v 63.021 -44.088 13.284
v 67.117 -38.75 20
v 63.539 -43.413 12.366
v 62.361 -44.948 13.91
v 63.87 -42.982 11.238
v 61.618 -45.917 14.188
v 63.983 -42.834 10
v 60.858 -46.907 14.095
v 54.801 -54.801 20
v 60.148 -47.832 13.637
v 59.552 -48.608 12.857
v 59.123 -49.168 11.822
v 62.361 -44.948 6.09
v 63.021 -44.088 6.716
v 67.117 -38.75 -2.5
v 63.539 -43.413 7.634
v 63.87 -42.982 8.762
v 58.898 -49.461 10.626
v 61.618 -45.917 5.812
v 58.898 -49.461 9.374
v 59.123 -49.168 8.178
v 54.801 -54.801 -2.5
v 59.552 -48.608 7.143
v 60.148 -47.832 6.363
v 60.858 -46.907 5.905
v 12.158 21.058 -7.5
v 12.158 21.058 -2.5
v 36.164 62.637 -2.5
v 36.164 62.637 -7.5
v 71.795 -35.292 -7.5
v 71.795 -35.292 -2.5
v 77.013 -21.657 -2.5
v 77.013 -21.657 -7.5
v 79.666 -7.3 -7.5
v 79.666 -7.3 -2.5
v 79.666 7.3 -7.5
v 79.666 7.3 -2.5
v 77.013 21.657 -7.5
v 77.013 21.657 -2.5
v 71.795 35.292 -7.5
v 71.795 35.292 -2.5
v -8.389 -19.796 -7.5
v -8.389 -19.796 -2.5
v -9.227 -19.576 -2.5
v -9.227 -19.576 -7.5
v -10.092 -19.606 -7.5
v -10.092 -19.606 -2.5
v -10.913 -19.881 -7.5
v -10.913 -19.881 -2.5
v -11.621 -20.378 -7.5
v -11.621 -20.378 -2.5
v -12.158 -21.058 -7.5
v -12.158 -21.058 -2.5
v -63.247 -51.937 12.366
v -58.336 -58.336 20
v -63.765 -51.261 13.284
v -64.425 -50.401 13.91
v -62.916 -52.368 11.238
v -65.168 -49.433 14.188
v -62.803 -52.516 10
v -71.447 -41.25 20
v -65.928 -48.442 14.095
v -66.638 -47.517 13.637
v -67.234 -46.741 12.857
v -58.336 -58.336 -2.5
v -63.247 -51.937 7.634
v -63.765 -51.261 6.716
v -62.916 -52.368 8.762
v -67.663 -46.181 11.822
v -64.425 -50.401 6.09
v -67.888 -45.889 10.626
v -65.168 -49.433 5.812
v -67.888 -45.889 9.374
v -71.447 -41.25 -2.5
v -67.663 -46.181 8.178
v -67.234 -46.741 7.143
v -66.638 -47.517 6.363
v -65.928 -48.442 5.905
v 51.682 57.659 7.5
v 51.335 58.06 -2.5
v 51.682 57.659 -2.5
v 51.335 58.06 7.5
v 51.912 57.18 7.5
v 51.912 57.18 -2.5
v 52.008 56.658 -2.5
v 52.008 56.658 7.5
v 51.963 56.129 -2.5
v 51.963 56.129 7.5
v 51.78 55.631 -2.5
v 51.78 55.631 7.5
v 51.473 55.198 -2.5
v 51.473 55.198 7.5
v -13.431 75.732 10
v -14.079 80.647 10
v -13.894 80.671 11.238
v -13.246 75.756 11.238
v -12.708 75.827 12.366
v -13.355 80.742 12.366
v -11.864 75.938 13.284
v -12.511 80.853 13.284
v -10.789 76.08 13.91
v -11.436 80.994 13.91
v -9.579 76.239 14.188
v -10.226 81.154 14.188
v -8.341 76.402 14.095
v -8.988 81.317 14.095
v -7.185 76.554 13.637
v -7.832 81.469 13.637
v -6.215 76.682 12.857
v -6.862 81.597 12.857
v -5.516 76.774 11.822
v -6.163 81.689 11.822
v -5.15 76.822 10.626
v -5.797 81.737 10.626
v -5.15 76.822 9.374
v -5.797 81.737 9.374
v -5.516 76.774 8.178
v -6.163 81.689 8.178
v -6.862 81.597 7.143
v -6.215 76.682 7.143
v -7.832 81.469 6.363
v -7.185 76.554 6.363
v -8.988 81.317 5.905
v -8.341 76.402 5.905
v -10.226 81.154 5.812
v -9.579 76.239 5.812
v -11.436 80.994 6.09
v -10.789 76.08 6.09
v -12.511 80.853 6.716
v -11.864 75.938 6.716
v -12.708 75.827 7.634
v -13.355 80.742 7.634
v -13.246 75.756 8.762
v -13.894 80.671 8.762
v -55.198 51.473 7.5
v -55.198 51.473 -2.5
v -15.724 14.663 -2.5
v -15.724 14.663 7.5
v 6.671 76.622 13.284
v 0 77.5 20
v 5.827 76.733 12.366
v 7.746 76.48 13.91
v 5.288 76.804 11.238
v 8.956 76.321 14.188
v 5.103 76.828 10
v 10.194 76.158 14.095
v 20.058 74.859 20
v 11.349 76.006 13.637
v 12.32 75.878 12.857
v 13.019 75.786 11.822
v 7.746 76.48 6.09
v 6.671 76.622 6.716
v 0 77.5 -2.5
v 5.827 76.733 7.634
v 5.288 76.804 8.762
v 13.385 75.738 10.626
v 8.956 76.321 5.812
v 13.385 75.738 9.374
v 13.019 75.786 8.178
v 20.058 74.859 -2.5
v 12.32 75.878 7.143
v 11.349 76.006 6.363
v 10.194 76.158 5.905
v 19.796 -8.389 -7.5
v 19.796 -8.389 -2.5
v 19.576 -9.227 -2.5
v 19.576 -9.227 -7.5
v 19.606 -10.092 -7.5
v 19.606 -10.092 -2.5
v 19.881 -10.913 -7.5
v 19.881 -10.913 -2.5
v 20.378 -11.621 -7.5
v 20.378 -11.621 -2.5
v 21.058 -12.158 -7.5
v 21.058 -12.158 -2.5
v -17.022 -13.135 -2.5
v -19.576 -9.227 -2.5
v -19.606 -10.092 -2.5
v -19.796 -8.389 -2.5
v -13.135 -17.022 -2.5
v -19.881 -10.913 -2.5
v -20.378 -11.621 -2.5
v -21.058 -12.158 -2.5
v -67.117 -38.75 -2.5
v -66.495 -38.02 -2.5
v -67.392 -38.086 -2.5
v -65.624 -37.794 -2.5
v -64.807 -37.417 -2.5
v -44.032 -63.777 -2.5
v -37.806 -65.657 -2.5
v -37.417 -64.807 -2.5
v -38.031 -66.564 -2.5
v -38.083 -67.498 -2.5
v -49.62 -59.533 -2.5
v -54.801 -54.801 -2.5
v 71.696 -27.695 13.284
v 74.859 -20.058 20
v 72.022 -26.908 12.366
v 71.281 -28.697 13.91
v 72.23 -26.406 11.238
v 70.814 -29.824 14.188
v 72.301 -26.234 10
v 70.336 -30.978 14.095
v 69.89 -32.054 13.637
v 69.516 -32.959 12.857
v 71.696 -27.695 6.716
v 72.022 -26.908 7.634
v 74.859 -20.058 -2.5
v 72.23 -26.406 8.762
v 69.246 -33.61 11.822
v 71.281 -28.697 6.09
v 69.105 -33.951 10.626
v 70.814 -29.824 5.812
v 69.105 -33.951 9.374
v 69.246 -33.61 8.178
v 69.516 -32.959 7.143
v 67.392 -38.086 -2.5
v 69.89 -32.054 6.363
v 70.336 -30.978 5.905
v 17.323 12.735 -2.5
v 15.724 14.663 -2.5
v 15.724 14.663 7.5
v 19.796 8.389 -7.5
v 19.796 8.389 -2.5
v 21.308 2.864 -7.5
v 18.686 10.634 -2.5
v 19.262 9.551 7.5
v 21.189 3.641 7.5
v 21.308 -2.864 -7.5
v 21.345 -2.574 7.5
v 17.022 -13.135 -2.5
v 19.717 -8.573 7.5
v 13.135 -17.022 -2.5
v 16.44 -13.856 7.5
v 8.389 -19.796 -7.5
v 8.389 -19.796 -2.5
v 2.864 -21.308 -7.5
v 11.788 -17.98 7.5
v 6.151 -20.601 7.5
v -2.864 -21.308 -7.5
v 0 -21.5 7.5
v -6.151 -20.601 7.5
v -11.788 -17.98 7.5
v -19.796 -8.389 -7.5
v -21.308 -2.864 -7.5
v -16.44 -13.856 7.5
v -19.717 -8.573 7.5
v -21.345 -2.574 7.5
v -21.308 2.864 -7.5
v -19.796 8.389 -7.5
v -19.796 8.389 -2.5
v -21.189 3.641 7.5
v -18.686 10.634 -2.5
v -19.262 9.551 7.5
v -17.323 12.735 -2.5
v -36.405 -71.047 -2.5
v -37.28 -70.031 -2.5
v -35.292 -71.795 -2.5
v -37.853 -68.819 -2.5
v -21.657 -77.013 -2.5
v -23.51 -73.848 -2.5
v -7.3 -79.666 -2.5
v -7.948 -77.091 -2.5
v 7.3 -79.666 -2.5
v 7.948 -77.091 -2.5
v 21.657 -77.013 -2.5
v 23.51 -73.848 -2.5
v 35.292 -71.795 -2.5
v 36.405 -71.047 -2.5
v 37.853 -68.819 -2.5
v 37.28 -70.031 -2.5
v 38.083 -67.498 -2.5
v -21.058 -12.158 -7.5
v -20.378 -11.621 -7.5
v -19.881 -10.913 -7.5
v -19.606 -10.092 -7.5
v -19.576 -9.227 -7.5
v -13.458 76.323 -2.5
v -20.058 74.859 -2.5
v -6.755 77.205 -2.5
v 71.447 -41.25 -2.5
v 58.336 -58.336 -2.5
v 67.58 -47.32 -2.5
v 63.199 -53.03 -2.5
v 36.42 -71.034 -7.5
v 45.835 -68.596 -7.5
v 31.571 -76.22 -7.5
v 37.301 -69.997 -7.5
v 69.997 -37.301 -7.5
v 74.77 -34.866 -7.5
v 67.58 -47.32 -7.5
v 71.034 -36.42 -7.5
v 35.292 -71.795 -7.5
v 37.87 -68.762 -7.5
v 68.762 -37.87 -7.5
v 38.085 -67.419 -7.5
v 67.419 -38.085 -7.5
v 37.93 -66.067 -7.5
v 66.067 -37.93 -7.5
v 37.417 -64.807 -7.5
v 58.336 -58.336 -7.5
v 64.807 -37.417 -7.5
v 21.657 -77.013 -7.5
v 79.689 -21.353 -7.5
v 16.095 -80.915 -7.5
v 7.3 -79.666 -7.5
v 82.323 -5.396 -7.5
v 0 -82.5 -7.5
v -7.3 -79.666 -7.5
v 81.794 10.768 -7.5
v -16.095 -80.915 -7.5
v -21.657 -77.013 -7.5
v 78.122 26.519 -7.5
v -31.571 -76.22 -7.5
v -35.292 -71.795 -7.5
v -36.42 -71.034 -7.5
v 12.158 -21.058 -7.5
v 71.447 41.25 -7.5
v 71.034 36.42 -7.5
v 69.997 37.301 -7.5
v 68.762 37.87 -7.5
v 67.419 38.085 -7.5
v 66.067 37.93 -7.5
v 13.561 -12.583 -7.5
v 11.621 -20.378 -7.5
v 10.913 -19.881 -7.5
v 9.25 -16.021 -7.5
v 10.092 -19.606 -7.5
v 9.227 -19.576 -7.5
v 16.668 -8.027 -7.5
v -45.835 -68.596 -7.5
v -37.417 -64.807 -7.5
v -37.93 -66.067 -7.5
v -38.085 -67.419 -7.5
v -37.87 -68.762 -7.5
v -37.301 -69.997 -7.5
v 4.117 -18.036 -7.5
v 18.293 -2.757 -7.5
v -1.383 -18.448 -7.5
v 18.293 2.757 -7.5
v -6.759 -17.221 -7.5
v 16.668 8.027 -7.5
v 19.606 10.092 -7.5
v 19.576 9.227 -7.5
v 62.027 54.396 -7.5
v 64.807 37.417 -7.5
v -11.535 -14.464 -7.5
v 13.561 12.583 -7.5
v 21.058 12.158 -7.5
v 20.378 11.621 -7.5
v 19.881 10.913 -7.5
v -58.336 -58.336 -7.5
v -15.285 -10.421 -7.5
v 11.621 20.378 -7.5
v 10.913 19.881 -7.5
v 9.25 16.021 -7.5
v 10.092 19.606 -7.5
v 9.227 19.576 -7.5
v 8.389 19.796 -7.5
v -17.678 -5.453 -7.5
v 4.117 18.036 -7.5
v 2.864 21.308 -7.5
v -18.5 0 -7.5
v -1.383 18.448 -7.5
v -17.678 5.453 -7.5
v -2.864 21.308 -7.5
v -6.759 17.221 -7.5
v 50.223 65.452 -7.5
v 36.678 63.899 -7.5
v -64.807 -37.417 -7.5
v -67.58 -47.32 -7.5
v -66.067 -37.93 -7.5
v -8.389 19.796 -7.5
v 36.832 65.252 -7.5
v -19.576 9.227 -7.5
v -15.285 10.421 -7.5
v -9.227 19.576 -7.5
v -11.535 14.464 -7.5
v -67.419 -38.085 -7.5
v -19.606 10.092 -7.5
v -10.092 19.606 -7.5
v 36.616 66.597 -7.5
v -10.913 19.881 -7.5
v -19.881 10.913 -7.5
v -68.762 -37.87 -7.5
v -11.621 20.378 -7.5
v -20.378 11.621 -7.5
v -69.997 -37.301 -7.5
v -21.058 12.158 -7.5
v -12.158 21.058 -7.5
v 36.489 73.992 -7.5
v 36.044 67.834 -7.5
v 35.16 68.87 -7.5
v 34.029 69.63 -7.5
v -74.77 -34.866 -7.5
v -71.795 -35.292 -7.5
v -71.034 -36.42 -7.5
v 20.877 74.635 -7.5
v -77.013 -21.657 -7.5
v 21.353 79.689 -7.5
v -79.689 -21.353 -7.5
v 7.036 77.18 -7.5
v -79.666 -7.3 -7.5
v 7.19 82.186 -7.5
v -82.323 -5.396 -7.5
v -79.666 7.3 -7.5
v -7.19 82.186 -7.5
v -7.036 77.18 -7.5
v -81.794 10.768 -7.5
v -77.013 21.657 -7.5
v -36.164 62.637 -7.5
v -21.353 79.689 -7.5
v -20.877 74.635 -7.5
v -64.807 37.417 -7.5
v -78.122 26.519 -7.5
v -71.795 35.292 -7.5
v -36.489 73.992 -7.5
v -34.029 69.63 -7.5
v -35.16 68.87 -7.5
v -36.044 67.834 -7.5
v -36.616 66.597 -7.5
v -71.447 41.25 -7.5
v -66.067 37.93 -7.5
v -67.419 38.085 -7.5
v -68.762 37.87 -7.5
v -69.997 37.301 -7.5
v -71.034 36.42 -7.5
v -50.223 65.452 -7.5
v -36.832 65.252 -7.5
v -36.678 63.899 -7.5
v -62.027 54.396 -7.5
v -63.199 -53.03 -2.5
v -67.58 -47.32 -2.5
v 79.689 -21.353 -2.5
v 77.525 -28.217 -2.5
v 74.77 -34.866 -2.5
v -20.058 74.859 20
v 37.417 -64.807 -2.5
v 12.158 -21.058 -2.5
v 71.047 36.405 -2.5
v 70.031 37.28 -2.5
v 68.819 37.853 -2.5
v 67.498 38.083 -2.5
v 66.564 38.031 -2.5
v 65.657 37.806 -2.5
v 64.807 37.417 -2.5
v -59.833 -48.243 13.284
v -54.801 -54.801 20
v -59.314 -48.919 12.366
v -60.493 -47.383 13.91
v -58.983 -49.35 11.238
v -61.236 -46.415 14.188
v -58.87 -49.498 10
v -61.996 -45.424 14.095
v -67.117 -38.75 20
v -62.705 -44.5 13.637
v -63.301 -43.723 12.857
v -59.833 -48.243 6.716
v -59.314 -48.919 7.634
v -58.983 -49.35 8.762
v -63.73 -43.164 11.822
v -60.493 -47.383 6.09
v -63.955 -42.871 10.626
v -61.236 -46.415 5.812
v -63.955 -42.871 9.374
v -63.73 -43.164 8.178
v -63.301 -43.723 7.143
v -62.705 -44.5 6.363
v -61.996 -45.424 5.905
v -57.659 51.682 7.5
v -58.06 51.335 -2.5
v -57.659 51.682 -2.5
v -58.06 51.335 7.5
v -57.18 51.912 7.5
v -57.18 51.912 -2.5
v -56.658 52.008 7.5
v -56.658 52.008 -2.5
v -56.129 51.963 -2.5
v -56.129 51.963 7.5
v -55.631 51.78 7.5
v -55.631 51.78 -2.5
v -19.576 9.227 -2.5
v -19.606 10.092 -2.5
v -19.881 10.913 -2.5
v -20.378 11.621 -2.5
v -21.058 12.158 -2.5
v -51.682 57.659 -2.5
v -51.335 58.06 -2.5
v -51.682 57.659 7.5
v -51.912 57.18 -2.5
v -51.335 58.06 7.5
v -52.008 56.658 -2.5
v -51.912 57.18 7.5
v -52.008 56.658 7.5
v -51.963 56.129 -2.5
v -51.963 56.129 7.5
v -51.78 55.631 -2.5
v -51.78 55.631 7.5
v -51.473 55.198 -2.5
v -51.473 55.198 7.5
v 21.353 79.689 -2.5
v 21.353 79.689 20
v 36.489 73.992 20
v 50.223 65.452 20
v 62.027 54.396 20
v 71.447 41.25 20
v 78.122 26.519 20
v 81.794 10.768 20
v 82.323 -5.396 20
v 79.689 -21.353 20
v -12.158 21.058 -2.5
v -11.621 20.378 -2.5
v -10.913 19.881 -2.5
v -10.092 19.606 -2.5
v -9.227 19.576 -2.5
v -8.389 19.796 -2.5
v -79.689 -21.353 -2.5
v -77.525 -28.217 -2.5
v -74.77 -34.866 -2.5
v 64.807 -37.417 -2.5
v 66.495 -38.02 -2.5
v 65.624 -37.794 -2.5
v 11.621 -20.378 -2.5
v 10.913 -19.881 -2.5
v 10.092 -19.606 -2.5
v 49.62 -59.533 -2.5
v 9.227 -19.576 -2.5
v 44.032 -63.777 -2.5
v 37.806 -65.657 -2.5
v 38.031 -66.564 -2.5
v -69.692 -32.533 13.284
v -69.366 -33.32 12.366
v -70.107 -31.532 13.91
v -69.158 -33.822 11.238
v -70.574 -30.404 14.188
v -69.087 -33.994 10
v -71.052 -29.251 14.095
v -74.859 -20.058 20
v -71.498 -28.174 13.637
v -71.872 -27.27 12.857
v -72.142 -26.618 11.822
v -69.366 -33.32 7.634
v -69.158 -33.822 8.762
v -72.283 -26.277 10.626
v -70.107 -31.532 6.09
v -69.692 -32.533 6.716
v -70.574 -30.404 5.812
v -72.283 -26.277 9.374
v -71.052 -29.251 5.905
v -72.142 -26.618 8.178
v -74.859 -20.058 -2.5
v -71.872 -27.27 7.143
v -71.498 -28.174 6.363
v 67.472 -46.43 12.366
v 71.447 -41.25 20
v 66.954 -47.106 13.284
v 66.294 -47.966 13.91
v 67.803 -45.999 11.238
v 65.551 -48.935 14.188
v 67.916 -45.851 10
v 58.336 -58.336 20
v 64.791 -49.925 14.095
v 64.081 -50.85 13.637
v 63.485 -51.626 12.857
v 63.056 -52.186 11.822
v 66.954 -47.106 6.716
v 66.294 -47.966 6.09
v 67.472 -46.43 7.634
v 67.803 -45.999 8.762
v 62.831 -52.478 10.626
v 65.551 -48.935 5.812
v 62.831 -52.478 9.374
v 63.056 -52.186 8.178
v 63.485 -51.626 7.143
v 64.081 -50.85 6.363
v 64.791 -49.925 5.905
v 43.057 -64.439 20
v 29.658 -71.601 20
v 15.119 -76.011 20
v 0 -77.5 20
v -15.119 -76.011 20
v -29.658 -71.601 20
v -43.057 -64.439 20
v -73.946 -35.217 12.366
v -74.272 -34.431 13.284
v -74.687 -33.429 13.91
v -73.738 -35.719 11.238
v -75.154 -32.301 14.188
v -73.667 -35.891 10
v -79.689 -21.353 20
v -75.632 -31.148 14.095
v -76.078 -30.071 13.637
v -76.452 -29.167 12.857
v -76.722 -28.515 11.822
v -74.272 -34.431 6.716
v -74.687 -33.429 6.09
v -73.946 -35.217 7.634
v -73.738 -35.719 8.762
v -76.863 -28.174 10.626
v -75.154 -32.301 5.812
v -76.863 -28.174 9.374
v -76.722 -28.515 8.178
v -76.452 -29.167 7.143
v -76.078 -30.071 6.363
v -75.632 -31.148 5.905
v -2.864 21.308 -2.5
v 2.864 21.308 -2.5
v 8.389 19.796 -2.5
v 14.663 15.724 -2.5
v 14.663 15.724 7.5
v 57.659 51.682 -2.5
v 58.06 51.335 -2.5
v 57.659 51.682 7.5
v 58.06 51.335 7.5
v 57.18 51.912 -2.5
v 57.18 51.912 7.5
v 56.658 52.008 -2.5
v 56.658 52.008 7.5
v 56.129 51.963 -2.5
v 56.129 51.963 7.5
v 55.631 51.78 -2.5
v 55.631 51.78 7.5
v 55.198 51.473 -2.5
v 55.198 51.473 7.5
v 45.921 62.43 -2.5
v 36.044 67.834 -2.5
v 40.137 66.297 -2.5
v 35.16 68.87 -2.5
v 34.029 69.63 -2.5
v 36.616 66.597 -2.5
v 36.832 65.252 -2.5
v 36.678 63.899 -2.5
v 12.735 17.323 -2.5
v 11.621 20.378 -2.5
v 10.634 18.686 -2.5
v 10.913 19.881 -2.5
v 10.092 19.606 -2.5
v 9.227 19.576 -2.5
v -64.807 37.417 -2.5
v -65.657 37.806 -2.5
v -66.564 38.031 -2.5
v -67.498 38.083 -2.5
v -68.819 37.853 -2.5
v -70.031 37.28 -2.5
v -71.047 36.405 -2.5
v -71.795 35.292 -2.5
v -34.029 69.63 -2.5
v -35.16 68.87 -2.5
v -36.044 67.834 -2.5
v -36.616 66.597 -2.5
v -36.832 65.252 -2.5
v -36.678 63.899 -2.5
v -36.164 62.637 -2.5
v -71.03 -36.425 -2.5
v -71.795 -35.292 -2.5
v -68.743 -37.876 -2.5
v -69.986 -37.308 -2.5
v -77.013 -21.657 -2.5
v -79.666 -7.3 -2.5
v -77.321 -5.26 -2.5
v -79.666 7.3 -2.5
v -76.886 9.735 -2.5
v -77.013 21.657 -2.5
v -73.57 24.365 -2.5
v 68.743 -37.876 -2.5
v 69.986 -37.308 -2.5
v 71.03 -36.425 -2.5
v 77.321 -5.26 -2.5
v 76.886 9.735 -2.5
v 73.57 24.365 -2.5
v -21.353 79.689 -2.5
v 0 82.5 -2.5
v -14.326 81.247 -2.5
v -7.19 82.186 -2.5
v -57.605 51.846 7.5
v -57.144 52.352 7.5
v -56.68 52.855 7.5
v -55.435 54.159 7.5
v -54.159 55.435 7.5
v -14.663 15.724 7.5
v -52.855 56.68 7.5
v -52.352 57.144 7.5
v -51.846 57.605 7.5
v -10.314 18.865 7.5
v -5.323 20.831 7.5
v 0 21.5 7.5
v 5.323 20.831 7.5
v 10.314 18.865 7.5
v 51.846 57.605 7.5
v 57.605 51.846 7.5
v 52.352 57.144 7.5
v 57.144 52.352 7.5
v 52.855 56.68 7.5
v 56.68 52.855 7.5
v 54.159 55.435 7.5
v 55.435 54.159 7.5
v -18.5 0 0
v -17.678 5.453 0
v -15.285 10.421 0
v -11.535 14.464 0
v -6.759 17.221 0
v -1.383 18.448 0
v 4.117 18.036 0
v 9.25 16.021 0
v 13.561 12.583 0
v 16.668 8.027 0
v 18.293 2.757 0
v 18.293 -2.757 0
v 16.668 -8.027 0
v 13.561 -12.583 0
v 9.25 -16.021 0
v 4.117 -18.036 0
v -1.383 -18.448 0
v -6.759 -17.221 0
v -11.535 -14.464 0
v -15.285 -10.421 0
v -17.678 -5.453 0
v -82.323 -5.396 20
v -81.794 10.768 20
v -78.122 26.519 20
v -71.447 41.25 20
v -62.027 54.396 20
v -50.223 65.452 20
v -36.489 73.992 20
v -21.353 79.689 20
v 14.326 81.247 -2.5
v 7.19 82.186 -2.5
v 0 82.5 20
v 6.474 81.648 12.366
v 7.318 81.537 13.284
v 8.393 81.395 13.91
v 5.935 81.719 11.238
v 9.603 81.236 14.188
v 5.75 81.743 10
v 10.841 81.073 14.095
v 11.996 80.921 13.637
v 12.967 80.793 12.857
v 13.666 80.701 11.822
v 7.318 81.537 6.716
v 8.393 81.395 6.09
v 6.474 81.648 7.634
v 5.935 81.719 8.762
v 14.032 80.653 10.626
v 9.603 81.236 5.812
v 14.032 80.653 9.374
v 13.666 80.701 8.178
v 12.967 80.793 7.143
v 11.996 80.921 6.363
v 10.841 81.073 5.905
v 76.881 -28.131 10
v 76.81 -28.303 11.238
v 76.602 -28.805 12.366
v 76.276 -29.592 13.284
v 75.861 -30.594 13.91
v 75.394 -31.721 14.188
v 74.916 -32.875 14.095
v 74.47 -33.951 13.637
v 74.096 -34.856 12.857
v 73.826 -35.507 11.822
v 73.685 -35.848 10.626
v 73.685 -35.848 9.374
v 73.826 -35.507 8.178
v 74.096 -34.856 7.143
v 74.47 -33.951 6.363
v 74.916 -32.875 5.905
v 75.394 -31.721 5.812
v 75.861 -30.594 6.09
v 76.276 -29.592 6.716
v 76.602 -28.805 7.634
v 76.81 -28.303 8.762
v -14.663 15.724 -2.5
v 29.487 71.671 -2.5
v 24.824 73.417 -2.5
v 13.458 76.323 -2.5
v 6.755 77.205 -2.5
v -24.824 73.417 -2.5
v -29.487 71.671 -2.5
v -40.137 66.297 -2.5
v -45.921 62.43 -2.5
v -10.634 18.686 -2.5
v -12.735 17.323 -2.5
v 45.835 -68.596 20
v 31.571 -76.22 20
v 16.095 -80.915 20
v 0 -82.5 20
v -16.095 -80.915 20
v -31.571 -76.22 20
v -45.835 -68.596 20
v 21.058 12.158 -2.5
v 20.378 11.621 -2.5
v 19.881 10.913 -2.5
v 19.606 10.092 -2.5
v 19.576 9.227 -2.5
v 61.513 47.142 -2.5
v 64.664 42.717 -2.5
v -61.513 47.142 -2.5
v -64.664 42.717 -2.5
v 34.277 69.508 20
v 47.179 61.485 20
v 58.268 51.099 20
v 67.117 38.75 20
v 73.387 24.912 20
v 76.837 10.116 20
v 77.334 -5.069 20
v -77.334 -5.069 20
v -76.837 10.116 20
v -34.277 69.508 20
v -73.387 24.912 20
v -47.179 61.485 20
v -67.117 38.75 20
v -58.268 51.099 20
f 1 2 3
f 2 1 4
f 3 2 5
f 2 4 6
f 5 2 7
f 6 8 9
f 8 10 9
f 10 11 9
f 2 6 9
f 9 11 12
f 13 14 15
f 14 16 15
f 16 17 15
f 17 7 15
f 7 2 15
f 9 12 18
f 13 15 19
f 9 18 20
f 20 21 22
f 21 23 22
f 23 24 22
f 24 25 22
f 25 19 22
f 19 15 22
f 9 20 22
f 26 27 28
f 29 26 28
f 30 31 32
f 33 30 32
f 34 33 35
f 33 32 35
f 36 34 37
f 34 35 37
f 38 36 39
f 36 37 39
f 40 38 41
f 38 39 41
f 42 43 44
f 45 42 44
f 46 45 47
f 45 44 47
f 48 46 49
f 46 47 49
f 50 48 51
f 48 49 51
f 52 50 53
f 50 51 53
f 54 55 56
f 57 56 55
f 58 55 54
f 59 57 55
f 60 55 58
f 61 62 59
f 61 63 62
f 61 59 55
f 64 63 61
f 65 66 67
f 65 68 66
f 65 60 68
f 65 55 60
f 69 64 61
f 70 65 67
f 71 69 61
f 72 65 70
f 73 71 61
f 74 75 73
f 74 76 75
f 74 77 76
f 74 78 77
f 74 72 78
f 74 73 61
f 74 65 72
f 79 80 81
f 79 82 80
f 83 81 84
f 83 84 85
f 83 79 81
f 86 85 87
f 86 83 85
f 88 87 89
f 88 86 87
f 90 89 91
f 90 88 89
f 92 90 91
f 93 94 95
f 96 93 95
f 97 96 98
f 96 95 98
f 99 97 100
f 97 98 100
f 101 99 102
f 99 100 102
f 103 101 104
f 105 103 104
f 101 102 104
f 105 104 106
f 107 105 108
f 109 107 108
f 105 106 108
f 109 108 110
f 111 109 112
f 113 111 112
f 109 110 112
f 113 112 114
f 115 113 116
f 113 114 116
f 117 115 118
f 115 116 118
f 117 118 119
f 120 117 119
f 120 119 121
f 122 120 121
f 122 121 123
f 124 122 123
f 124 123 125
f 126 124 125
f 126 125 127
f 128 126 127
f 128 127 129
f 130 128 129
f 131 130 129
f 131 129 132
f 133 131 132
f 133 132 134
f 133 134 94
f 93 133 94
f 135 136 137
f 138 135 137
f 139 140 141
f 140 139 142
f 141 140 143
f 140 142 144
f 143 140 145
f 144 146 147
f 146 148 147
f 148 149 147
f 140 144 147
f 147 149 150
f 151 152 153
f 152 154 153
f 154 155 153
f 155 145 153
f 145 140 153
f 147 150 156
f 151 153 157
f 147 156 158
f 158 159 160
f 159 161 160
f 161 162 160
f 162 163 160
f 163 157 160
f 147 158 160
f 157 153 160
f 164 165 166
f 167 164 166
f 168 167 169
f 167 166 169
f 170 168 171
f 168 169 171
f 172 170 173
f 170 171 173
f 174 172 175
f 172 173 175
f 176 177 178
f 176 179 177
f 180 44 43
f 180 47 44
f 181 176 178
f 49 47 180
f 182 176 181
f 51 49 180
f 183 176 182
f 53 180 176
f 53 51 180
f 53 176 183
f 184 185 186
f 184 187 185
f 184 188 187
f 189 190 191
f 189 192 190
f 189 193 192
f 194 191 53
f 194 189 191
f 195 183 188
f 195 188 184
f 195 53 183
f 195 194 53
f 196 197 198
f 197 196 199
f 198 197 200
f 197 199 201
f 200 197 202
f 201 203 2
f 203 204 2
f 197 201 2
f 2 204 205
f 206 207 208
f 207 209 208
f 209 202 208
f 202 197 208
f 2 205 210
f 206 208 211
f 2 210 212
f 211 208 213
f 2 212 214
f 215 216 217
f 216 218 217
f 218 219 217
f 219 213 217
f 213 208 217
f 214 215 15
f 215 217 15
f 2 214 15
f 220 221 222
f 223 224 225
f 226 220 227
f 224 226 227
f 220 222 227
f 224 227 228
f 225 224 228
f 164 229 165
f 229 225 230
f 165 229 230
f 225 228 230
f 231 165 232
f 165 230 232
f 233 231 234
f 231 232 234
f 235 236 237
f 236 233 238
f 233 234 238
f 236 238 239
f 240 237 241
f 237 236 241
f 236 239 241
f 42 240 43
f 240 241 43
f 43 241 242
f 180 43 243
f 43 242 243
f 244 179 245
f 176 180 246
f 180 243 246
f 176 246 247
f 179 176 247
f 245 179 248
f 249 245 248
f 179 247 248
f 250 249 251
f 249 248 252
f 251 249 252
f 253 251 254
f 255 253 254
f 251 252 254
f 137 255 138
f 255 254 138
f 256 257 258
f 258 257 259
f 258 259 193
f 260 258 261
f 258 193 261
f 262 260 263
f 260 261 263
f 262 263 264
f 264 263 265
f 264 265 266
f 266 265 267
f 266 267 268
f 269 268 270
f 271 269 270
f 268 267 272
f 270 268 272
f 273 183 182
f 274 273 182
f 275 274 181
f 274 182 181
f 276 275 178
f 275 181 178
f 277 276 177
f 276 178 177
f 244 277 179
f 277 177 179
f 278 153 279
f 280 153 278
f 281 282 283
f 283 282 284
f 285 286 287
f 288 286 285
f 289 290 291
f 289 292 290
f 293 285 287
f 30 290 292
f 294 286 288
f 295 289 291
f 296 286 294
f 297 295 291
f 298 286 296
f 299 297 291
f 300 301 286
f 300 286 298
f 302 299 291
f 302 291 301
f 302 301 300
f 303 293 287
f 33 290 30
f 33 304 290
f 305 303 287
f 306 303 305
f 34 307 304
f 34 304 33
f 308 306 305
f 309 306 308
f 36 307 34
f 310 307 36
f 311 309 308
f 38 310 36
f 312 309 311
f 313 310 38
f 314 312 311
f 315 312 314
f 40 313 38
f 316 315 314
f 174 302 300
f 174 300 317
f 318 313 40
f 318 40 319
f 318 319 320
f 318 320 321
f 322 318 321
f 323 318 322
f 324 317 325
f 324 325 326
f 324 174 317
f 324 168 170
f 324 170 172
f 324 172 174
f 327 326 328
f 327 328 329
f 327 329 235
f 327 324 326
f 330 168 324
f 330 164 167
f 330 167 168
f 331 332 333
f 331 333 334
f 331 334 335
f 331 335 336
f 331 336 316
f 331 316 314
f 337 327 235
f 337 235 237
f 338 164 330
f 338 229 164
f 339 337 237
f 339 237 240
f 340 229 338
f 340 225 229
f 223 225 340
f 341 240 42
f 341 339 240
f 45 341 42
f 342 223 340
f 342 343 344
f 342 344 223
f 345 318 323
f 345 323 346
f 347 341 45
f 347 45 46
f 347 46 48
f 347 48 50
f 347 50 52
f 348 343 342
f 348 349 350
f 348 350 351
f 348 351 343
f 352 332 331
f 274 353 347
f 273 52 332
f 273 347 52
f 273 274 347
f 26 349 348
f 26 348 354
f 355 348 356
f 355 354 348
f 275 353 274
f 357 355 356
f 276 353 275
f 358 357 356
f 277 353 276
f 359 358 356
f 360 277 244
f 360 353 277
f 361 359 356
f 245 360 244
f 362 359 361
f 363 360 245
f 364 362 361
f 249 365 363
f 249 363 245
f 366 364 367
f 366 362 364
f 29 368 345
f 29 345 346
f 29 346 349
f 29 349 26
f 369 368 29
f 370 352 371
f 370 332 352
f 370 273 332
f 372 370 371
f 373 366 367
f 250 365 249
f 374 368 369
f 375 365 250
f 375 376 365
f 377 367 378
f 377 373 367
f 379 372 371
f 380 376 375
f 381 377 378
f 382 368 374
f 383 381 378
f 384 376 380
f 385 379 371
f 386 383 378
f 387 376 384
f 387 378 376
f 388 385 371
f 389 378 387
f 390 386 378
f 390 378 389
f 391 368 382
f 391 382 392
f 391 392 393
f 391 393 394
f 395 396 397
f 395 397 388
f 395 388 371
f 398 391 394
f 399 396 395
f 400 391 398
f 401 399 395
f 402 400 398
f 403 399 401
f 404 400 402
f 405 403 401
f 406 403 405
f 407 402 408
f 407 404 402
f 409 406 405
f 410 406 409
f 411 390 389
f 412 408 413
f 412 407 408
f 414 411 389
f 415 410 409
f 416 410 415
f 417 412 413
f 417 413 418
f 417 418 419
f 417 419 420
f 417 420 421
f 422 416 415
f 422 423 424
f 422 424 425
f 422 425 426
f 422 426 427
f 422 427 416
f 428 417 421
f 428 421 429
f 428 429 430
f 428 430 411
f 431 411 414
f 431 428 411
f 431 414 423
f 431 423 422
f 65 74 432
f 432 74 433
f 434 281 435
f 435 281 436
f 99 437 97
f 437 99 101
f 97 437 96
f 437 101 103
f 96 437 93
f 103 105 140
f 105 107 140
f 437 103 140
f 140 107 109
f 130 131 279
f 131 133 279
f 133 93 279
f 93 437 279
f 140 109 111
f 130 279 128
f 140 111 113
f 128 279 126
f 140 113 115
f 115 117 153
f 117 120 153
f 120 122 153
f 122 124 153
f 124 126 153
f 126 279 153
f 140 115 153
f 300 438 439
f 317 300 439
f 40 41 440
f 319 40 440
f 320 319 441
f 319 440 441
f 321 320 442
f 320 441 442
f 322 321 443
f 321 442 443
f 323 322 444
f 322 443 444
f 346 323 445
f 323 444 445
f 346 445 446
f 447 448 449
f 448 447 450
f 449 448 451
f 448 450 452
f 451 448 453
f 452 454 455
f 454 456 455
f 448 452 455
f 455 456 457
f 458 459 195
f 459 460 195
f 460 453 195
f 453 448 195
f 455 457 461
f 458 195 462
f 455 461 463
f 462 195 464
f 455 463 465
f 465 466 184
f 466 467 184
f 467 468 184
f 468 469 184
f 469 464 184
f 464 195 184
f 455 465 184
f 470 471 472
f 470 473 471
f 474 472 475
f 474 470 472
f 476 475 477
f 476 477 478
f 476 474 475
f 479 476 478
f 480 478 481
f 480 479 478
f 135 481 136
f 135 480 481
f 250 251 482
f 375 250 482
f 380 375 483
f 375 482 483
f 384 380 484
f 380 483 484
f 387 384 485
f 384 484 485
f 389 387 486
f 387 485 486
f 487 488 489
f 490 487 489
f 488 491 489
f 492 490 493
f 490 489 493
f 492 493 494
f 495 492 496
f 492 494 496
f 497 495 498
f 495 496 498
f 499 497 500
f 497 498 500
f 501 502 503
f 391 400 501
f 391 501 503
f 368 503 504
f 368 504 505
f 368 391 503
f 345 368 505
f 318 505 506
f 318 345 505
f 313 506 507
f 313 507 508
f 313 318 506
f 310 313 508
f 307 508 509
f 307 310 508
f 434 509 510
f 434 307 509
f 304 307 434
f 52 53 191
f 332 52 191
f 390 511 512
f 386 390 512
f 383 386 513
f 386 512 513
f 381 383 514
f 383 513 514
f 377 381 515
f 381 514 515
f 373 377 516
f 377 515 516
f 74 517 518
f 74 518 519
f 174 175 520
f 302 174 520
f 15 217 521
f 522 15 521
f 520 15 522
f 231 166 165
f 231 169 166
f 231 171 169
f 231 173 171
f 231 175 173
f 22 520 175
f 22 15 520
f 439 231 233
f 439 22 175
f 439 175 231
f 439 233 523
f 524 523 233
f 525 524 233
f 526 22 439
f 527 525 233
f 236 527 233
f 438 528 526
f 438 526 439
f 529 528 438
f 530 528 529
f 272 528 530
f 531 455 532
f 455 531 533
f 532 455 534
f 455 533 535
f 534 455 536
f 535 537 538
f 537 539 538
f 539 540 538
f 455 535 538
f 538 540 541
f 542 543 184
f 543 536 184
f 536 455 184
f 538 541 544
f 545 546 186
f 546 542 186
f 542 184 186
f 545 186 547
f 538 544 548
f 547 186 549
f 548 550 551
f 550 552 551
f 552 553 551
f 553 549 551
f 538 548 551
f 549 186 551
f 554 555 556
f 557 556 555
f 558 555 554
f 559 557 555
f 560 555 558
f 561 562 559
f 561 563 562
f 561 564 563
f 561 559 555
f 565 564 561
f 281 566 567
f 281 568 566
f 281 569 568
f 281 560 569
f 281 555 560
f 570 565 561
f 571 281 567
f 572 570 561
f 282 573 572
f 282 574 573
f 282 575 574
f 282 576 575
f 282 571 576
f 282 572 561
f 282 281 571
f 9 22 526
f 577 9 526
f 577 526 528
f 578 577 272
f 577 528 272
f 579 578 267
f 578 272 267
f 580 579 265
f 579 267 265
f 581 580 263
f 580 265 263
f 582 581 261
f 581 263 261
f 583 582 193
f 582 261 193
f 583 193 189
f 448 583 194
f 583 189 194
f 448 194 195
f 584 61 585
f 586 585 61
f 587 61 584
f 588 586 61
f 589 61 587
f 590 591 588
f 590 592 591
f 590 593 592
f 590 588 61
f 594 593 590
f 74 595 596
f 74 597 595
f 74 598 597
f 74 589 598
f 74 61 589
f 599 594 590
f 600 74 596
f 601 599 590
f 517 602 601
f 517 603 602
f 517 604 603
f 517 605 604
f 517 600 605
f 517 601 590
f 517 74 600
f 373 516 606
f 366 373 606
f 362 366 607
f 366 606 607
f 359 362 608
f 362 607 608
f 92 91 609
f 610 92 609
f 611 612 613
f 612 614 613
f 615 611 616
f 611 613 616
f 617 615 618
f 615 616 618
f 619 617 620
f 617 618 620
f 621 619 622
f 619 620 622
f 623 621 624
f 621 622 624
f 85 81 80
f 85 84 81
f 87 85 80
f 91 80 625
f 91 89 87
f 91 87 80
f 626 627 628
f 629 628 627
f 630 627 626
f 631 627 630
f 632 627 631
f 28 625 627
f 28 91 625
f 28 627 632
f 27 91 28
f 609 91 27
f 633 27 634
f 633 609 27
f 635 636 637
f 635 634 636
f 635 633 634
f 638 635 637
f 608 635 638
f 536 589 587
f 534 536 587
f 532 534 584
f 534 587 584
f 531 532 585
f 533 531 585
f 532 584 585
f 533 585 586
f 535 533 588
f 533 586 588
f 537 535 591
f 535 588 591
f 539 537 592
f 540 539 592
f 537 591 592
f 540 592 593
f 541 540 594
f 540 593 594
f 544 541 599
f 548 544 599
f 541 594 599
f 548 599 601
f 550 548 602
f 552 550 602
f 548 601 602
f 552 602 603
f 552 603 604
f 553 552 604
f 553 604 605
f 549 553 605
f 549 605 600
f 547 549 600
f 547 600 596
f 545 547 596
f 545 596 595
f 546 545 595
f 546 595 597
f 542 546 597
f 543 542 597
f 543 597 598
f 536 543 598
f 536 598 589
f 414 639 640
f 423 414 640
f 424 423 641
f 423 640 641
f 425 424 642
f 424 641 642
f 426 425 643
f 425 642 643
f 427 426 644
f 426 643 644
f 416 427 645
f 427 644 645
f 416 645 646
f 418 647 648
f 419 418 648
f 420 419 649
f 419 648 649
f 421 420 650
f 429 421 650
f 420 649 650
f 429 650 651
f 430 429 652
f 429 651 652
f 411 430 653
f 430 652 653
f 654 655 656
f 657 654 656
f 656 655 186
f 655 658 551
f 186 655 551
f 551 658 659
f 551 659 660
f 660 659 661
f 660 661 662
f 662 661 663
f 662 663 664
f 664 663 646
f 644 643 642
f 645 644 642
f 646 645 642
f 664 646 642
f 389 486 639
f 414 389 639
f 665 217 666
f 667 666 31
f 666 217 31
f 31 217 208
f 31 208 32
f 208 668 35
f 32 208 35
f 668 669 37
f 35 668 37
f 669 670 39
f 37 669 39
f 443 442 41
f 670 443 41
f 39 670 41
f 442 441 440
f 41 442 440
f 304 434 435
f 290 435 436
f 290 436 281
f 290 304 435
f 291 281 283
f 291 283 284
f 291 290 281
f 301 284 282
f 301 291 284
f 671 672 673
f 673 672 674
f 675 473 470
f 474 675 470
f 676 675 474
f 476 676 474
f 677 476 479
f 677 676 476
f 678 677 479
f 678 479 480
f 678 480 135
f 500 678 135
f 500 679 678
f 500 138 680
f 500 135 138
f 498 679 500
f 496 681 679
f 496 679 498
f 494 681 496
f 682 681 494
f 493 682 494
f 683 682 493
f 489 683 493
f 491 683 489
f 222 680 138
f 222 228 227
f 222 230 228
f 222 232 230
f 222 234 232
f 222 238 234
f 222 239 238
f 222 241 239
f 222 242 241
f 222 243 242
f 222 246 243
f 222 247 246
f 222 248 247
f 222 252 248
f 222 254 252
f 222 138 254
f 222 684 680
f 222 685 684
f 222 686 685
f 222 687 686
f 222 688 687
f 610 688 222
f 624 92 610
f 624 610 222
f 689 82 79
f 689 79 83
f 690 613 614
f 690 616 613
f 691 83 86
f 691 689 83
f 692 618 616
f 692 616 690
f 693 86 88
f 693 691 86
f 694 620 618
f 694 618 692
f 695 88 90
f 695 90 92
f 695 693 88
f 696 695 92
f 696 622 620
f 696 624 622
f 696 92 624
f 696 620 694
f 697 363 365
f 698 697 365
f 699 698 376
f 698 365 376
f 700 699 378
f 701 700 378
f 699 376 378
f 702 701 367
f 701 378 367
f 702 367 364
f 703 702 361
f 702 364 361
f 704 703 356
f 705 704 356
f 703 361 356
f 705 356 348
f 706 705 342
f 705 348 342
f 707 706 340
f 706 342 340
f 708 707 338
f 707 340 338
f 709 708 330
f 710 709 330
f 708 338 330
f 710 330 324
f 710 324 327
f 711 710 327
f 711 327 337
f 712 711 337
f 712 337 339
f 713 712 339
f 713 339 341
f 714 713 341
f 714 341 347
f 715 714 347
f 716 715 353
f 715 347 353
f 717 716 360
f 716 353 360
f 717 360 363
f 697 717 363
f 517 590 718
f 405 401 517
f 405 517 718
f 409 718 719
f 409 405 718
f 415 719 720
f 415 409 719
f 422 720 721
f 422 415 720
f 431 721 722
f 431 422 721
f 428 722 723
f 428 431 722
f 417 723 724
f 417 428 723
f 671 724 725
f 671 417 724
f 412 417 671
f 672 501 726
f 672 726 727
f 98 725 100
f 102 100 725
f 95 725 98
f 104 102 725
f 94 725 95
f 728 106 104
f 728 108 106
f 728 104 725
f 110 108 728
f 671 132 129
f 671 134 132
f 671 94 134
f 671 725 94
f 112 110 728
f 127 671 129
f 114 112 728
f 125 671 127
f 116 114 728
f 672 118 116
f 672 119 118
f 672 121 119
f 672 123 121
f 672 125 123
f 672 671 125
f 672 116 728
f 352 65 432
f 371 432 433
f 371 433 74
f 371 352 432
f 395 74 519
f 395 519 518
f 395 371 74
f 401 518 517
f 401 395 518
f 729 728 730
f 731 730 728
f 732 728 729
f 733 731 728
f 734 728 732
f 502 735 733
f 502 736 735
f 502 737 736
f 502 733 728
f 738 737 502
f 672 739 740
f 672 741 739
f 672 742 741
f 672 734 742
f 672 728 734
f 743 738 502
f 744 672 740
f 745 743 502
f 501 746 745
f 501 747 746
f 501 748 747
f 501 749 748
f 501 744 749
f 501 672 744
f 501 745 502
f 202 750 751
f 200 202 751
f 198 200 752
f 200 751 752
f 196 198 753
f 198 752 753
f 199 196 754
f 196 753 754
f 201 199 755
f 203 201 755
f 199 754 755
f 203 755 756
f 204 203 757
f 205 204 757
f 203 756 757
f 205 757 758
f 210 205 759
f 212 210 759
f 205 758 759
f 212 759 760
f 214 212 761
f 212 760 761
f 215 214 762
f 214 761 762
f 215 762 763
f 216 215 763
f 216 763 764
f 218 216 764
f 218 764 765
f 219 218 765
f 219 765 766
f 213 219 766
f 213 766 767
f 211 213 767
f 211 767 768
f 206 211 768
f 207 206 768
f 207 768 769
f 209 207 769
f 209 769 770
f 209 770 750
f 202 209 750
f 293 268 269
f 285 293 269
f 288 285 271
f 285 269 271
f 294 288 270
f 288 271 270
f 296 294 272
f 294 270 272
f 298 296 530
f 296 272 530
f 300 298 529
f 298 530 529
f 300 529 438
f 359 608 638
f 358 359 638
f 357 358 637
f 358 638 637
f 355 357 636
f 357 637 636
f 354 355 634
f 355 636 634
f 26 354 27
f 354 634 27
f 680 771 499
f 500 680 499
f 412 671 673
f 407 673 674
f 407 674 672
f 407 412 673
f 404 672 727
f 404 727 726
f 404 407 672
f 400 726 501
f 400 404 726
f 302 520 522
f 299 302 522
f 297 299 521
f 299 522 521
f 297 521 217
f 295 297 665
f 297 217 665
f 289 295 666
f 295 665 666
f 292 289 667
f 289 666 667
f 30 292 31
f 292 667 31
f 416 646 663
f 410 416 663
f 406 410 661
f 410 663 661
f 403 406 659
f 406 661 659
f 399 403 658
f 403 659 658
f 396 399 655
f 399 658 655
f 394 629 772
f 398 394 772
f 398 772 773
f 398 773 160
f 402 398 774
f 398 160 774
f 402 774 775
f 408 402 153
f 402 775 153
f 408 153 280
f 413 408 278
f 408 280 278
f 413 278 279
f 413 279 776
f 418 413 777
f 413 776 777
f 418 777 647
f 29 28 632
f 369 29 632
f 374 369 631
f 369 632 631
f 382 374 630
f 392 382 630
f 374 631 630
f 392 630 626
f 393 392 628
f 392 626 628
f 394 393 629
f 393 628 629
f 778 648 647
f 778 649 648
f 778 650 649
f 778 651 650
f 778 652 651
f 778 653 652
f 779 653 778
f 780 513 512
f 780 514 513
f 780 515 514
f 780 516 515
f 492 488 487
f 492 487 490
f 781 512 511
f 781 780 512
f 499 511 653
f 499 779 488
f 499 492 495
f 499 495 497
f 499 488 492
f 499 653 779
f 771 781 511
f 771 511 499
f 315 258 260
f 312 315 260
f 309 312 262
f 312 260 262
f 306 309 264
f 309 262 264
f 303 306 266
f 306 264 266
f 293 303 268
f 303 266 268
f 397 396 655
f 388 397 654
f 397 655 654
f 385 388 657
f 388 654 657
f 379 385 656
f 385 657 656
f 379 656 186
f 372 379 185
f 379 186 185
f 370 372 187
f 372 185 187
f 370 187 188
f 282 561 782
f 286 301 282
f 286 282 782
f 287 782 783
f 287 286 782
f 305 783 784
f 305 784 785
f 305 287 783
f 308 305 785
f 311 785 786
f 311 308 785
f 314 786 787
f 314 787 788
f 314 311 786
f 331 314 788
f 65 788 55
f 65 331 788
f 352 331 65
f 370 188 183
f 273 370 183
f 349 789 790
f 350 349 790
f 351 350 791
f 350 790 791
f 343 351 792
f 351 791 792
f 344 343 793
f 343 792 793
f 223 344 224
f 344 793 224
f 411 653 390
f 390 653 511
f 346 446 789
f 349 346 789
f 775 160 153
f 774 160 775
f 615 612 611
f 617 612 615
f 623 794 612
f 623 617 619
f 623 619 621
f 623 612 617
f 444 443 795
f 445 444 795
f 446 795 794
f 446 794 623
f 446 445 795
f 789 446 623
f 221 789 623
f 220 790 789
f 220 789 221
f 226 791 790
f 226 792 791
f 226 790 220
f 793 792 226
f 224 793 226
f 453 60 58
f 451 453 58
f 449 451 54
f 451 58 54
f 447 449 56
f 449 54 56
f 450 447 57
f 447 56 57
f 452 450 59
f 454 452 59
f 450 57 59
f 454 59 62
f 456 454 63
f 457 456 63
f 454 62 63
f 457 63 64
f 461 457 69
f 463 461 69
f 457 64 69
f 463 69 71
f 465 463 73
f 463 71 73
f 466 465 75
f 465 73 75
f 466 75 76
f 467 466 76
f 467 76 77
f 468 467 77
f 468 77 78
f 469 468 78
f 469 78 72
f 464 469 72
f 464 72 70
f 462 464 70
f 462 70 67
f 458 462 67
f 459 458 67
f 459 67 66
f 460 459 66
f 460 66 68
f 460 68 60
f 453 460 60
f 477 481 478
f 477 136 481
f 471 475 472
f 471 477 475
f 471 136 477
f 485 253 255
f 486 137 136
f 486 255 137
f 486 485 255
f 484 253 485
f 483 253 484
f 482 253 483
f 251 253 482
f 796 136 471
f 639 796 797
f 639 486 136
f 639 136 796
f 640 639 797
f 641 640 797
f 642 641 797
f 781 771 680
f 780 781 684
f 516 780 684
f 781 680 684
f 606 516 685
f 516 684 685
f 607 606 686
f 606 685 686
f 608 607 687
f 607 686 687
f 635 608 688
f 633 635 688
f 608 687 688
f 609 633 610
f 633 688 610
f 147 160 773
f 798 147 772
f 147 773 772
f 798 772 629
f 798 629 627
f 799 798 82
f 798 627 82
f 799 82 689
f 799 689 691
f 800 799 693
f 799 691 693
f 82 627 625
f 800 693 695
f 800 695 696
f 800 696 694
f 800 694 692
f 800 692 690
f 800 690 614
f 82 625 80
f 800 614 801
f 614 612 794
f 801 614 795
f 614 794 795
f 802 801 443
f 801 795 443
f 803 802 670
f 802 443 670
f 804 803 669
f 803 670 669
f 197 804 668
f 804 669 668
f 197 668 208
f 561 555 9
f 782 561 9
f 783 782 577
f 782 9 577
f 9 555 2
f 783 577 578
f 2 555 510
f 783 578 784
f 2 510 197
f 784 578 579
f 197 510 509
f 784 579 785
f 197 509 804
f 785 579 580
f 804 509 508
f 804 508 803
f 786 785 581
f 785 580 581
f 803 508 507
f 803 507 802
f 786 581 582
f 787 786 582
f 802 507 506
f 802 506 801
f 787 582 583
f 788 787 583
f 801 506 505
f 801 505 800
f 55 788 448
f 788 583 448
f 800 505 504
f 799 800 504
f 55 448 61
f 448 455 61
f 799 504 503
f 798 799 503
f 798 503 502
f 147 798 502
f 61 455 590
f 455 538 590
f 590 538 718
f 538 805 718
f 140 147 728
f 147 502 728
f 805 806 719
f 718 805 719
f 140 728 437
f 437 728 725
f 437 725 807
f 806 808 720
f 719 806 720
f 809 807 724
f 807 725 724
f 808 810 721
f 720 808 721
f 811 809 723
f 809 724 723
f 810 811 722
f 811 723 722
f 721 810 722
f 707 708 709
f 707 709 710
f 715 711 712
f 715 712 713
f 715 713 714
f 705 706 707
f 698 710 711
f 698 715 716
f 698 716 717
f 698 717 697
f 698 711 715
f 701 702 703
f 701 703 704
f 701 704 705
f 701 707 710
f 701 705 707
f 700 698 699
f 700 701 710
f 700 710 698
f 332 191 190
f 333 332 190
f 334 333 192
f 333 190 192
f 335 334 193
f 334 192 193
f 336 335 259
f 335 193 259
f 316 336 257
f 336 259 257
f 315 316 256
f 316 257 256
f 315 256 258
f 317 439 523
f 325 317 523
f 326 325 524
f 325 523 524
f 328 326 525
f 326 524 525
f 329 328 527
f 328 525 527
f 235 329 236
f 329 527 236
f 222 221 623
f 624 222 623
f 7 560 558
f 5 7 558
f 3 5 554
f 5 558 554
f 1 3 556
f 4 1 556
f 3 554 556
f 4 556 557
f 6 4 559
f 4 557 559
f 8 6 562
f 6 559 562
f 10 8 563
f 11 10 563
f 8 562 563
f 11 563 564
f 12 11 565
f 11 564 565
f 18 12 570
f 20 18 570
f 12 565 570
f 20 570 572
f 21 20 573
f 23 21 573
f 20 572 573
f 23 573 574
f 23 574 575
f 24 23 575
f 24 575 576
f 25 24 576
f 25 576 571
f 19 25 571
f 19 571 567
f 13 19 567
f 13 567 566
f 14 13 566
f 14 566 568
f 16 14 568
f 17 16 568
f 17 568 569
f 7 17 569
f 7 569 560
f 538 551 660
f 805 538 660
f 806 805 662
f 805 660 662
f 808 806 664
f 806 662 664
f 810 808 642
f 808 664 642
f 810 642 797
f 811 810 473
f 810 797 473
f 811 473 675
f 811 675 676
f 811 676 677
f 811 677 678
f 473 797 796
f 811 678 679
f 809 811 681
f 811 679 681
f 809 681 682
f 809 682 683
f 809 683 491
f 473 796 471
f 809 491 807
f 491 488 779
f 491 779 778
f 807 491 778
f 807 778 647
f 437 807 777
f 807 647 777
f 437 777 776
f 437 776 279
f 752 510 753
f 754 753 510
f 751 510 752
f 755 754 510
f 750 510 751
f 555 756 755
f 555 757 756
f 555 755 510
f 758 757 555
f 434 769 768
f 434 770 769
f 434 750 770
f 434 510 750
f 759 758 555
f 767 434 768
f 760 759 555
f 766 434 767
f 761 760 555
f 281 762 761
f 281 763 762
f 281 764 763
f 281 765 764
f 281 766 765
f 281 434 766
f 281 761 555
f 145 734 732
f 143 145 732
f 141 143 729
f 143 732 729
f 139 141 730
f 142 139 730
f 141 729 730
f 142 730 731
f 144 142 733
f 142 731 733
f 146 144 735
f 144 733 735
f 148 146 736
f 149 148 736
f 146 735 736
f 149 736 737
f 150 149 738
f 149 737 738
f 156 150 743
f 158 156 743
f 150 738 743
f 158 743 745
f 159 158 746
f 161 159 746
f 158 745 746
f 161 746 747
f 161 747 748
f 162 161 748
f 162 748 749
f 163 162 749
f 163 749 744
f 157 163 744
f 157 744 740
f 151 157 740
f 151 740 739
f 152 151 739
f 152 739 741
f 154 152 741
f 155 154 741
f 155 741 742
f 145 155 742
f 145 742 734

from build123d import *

# Parameters (mm, degrees)
EXTRUDE_1_DEPTH                  = 20
EXTRUDE_1_DEPTH_BACK             = 7.5
EXTRUDE_3_DEPTH                  = 7.5
EXTRUDE_3_DEPTH_BACK             = 7.5
SKETCH_3_R                       = 21.5
SKETCH_4_R                       = 18.5
CUT_EXTRUDE_1_DEPTH              = 7.5
SKETCH_12_W                      = 5
SKETCH_12_H                      = 61
CUT_EXTRUDE_6_DEPTH              = 119.822346383
REVOLVE_START                    = -2.5
REVOLVE_3_DEPTH                  = 10
FILLET_1_R                       = 2
PATTERN_CIRCULAR_1_COUNT         = 2
PATTERN_CIRCULAR_1_ANGLE         = 90
FILLET_1_OF_PATTERN_CIRCULAR_1_R = 2
CUT_EXTRUDE_7_REACH              = 191.328
SKETCH_15_R                      = 4.2
CUT_EXTRUDE_8_REACH              = 191.328
SKETCH_16_R                      = 4.2
PATTERN_CIRCULAR_2_COUNT         = 3


# Read off the part's stored shape, not the designer's step: 旋转3
with BuildPart() as part:
    # 草图1 → 凸台-拉伸1 (new, two sides: drawn at the far end of the back side and taken through both)
    with BuildSketch(Plane.XY.offset(-EXTRUDE_1_DEPTH_BACK)):
        with BuildLine():
            Line((0, 82.5), (21.352571221, 79.688880669))
            ThreePointArc((21.352571221, 79.688880669), (71.447095812, 41.25), (79.688880669, -21.352571221))
            Line((79.688880669, -21.352571221), (71.447095812, -41.25))
            Line((71.447095812, -41.25), (58.336309448, -58.336309448))
            ThreePointArc((58.336309448, -58.336309448), (0, -82.5), (-58.336309448, -58.336309448))
            Line((-58.336309448, -58.336309448), (-71.447095812, -41.25))
            Line((-71.447095812, -41.25), (-79.688880669, -21.352571221))
            ThreePointArc((-79.688880669, -21.352571221), (-71.447095812, 41.25), (-21.352571221, 79.688880669))
            Line((-21.352571221, 79.688880669), (0, 82.5))
        make_face()
        with BuildLine():
            Line((0, 77.5), (20.058475995, 74.859251537))
            ThreePointArc((20.058475995, 74.859251537), (67.116968793, 38.75), (74.859251537, -20.058475995))
            Line((74.859251537, -20.058475995), (67.116968793, -38.75))
            Line((67.116968793, -38.75), (54.800775542, -54.800775542))
            ThreePointArc((54.800775542, -54.800775542), (0, -77.5), (-54.800775542, -54.800775542))
            Line((-54.800775542, -54.800775542), (-67.116968793, -38.75))
            Line((-67.116968793, -38.75), (-74.859251537, -20.058475995))
            ThreePointArc((-74.859251537, -20.058475995), (-67.116968793, 38.75), (-20.058475995, 74.859251537))
            Line((-20.058475995, 74.859251537), (0, 77.5))
        make_face(mode=Mode.SUBTRACT)
    extrude(amount=EXTRUDE_1_DEPTH + EXTRUDE_1_DEPTH_BACK)



with BuildPart() as body_2:
    # 草图3 → 凸台-拉伸3 (new, two sides: drawn at the far end of the back side and taken through both)
    with BuildSketch(Plane.XY.offset(-EXTRUDE_3_DEPTH_BACK)):
        Circle(SKETCH_3_R)
    extrude(amount=EXTRUDE_3_DEPTH + EXTRUDE_3_DEPTH_BACK)

    # 草图4 → 切除-拉伸1 (cut)
    with BuildSketch(Plane(origin=(0, 0, -7.5), x_dir=(-1, 0, 0), z_dir=(0, 0, -1))):
        Circle(SKETCH_4_R)
    extrude(amount=-CUT_EXTRUDE_1_DEPTH, mode=Mode.SUBTRACT)


with BuildPart() as part_1:
    add(part.part)

    add(body_2.part)  # 旋转2 merges body 2
    # 草图12 → 旋转2 (revolve)
    with BuildSketch(Plane(origin=(0, 0, 0), x_dir=(0, 0, -1), z_dir=(1, 0, 0)), mode=Mode.PRIVATE) as revolve_2_sk:
        with Locations((5, 52)):
            Rectangle(SKETCH_12_W, SKETCH_12_H)
    revolve(revolve_2_sk.sketch.rotate(Axis((0, 0, 0), (0, 0, -1)), 90), axis=Axis((0, 0, 0), (0, 0, -1)))

    # 草图13 → 切除-拉伸6 (cut, through all)
    with BuildSketch(Plane.XY.offset(-2.5)):
        with BuildLine():
            Line((-36.163690354, 62.637349082), (-12.157816416, 21.057955741))
            ThreePointArc((-12.157816416, 21.057955741), (-10.512484879, 19.713262861), (-8.389159771, 19.795757079))
            ThreePointArc((-8.389159771, 19.795757079), (0, 21.5), (8.389159771, 19.795757079))
            ThreePointArc((8.389159771, 19.795757079), (10.512484879, 19.713262861), (12.157816416, 21.057955741))
            Line((12.157816416, 21.057955741), (36.163690354, 62.637349082))
            ThreePointArc((36.163690354, 62.637349082), (36.615666268, 66.597311937), (34.028981496, 69.629580053))
            ThreePointArc((34.028981496, 69.629580053), (0, 77.5), (-34.028981496, 69.629580053))
            ThreePointArc((-34.028981496, 69.629580053), (-36.615666268, 66.597311937), (-36.163690354, 62.637349082))
        make_face()
        with BuildLine():
            Line((64.807406984, 37.416573868), (21.057955741, 12.157816416))
            ThreePointArc((21.057955741, 12.157816416), (19.713262861, 10.512484879), (19.795757079, 8.389159771))
            ThreePointArc((19.795757079, 8.389159771), (21.5, 0), (19.795757079, -8.389159771))
            ThreePointArc((19.795757079, -8.389159771), (19.713262861, -10.512484879), (21.057955741, -12.157816416))
            Line((21.057955741, -12.157816416), (64.807406984, -37.416573868))
            ThreePointArc((64.807406984, -37.416573868), (68.761859517, -37.870228599), (71.79456745, -35.292209972))
            ThreePointArc((71.79456745, -35.292209972), (80, 0), (71.79456745, 35.292209972))
            ThreePointArc((71.79456745, 35.292209972), (68.761859517, 37.870228599), (64.807406984, 37.416573868))
        make_face()
        with BuildLine():
            Line((37.416573868, -64.807406984), (12.157816416, -21.057955741))
            ThreePointArc((12.157816416, -21.057955741), (10.512484879, -19.713262861), (8.389159771, -19.795757079))
            ThreePointArc((8.389159771, -19.795757079), (0, -21.5), (-8.389159771, -19.795757079))
            ThreePointArc((-8.389159771, -19.795757079), (-10.512484879, -19.713262861), (-12.157816416, -21.057955741))
            Line((-12.157816416, -21.057955741), (-37.416573868, -64.807406984))
            ThreePointArc((-37.416573868, -64.807406984), (-37.870228599, -68.761859517), (-35.292209972, -71.79456745))
            ThreePointArc((-35.292209972, -71.79456745), (0, -80), (35.292209972, -71.79456745))
            ThreePointArc((35.292209972, -71.79456745), (37.870228599, -68.761859517), (37.416573868, -64.807406984))
        make_face()
        with BuildLine():
            Line((-64.807406984, -37.416573868), (-21.057955741, -12.157816416))
            ThreePointArc((-21.057955741, -12.157816416), (-19.713262861, -10.512484879), (-19.795757079, -8.389159771))
            ThreePointArc((-19.795757079, -8.389159771), (-21.5, 0), (-19.795757079, 8.389159771))
            ThreePointArc((-19.795757079, 8.389159771), (-19.713262861, 10.512484879), (-21.057955741, 12.157816416))
            Line((-21.057955741, 12.157816416), (-64.807406984, 37.416573868))
            ThreePointArc((-64.807406984, 37.416573868), (-68.761859517, 37.870228599), (-71.79456745, 35.292209972))
            ThreePointArc((-71.79456745, 35.292209972), (-80, 0), (-71.79456745, -35.292209972))
            ThreePointArc((-71.79456745, -35.292209972), (-68.761859517, -37.870228599), (-64.807406984, -37.416573868))
        make_face()
    extrude(amount=-CUT_EXTRUDE_6_DEPTH, mode=Mode.SUBTRACT)

    # 旋转3 outline → 旋转3 (add)
    with BuildSketch(Plane.XY.offset(REVOLVE_START)):
        with BuildLine():
            Line((52.854872905, 56.679911875), (14.662964741, 15.724104585))
            ThreePointArc((14.662964741, 15.724104585), (15.202795796, 15.202795796), (15.724104585, 14.662964741))
            Line((15.724104585, 14.662964741), (56.679911875, 52.854872905))
            ThreePointArc((56.679911875, 52.854872905), (54.800775542, 54.800775542), (52.854872905, 56.679911875))
        make_face()
    revolve_3 = extrude(amount=REVOLVE_3_DEPTH)

    # 圆角1
    fillet_1_edges = [part_1.edges().sort_by_distance(p)[0] for p in [
        (52.854872905, 56.679911875, 2.5),
        (56.679911875, 52.854872905, 2.5),
    ]]
    fillet(fillet_1_edges, radius=FILLET_1_R)

    # 阵列(圆周)1: 旋转3 ×2 about axis
    pattern_circular_1_axis = Axis((0, 0, 0), (0, 0, 1))
    for i in range(1, PATTERN_CIRCULAR_1_COUNT):
        add(revolve_3.rotate(pattern_circular_1_axis, i * PATTERN_CIRCULAR_1_ANGLE / (PATTERN_CIRCULAR_1_COUNT - 1)))

    # 圆角1 of 阵列(圆周)1
    fillet_1_of_pattern_circular_1_edges = [part_1.edges().sort_by_distance(p)[0] for p in [
        (-56.679911875, 52.854872905, 2.5),
        (-52.854872905, 56.679911875, 2.5),
    ]]
    fillet(fillet_1_of_pattern_circular_1_edges, radius=FILLET_1_OF_PATTERN_CIRCULAR_1_R)

    # 草图15 → 切除-拉伸7 (cut, up to next)
    with BuildSketch(Plane(origin=(10.67628561, 81.094440334, 0), x_dir=(0.991444861373809, -0.13052619222006237, 0), z_dir=(0.13052619222006237, 0.9914448613738092, 0)), mode=Mode.PRIVATE) as cut_extrude_7_sk1:
        with Locations(Location((-0.768410858, -10, 0), (0, 0, 180))):
            Circle(SKETCH_15_R)
    cut_extrude_7_tool1 = extrude(cut_extrude_7_sk1.sketch, amount=-CUT_EXTRUDE_7_REACH, mode=Mode.PRIVATE) & part_1.part
    cut_extrude_7 = cut_extrude_7_tool1.solids().sort_by_distance((9.914449, 81.194738, 10))[0]
    add(cut_extrude_7, mode=Mode.SUBTRACT)

    # 草图16 → 切除-拉伸8 (cut, up to next)
    with BuildSketch(Plane(origin=(-10.67628561, 81.094440334, 0), x_dir=(0.991444861373809, 0.13052619222006237, 0), z_dir=(-0.13052619222006237, 0.9914448613738092, 0)), mode=Mode.PRIVATE) as cut_extrude_8_sk1:
        with Locations(Location((0.768410858, -10, 0), (0, 0, 180))):
            Circle(SKETCH_16_R)
    cut_extrude_8_tool1 = extrude(cut_extrude_8_sk1.sketch, amount=-CUT_EXTRUDE_8_REACH, mode=Mode.PRIVATE) & part_1.part
    cut_extrude_8 = cut_extrude_8_tool1.solids().sort_by_distance((-9.914449, 81.194738, 10))[0]
    add(cut_extrude_8, mode=Mode.SUBTRACT)

    # 阵列(圆周)2: 切除-拉伸7, 切除-拉伸8 ×3 about axis
    pattern_circular_2_axis = Axis((0, 0, 0), (0, 0, 1))
    add([cut_extrude_7.rotate(pattern_circular_2_axis, i * 360 / PATTERN_CIRCULAR_2_COUNT) for i in range(1, PATTERN_CIRCULAR_2_COUNT)], mode=Mode.SUBTRACT)
    add([cut_extrude_8.rotate(pattern_circular_2_axis, i * 360 / PATTERN_CIRCULAR_2_COUNT) for i in range(1, PATTERN_CIRCULAR_2_COUNT)], mode=Mode.SUBTRACT)


solid = part_1.part
